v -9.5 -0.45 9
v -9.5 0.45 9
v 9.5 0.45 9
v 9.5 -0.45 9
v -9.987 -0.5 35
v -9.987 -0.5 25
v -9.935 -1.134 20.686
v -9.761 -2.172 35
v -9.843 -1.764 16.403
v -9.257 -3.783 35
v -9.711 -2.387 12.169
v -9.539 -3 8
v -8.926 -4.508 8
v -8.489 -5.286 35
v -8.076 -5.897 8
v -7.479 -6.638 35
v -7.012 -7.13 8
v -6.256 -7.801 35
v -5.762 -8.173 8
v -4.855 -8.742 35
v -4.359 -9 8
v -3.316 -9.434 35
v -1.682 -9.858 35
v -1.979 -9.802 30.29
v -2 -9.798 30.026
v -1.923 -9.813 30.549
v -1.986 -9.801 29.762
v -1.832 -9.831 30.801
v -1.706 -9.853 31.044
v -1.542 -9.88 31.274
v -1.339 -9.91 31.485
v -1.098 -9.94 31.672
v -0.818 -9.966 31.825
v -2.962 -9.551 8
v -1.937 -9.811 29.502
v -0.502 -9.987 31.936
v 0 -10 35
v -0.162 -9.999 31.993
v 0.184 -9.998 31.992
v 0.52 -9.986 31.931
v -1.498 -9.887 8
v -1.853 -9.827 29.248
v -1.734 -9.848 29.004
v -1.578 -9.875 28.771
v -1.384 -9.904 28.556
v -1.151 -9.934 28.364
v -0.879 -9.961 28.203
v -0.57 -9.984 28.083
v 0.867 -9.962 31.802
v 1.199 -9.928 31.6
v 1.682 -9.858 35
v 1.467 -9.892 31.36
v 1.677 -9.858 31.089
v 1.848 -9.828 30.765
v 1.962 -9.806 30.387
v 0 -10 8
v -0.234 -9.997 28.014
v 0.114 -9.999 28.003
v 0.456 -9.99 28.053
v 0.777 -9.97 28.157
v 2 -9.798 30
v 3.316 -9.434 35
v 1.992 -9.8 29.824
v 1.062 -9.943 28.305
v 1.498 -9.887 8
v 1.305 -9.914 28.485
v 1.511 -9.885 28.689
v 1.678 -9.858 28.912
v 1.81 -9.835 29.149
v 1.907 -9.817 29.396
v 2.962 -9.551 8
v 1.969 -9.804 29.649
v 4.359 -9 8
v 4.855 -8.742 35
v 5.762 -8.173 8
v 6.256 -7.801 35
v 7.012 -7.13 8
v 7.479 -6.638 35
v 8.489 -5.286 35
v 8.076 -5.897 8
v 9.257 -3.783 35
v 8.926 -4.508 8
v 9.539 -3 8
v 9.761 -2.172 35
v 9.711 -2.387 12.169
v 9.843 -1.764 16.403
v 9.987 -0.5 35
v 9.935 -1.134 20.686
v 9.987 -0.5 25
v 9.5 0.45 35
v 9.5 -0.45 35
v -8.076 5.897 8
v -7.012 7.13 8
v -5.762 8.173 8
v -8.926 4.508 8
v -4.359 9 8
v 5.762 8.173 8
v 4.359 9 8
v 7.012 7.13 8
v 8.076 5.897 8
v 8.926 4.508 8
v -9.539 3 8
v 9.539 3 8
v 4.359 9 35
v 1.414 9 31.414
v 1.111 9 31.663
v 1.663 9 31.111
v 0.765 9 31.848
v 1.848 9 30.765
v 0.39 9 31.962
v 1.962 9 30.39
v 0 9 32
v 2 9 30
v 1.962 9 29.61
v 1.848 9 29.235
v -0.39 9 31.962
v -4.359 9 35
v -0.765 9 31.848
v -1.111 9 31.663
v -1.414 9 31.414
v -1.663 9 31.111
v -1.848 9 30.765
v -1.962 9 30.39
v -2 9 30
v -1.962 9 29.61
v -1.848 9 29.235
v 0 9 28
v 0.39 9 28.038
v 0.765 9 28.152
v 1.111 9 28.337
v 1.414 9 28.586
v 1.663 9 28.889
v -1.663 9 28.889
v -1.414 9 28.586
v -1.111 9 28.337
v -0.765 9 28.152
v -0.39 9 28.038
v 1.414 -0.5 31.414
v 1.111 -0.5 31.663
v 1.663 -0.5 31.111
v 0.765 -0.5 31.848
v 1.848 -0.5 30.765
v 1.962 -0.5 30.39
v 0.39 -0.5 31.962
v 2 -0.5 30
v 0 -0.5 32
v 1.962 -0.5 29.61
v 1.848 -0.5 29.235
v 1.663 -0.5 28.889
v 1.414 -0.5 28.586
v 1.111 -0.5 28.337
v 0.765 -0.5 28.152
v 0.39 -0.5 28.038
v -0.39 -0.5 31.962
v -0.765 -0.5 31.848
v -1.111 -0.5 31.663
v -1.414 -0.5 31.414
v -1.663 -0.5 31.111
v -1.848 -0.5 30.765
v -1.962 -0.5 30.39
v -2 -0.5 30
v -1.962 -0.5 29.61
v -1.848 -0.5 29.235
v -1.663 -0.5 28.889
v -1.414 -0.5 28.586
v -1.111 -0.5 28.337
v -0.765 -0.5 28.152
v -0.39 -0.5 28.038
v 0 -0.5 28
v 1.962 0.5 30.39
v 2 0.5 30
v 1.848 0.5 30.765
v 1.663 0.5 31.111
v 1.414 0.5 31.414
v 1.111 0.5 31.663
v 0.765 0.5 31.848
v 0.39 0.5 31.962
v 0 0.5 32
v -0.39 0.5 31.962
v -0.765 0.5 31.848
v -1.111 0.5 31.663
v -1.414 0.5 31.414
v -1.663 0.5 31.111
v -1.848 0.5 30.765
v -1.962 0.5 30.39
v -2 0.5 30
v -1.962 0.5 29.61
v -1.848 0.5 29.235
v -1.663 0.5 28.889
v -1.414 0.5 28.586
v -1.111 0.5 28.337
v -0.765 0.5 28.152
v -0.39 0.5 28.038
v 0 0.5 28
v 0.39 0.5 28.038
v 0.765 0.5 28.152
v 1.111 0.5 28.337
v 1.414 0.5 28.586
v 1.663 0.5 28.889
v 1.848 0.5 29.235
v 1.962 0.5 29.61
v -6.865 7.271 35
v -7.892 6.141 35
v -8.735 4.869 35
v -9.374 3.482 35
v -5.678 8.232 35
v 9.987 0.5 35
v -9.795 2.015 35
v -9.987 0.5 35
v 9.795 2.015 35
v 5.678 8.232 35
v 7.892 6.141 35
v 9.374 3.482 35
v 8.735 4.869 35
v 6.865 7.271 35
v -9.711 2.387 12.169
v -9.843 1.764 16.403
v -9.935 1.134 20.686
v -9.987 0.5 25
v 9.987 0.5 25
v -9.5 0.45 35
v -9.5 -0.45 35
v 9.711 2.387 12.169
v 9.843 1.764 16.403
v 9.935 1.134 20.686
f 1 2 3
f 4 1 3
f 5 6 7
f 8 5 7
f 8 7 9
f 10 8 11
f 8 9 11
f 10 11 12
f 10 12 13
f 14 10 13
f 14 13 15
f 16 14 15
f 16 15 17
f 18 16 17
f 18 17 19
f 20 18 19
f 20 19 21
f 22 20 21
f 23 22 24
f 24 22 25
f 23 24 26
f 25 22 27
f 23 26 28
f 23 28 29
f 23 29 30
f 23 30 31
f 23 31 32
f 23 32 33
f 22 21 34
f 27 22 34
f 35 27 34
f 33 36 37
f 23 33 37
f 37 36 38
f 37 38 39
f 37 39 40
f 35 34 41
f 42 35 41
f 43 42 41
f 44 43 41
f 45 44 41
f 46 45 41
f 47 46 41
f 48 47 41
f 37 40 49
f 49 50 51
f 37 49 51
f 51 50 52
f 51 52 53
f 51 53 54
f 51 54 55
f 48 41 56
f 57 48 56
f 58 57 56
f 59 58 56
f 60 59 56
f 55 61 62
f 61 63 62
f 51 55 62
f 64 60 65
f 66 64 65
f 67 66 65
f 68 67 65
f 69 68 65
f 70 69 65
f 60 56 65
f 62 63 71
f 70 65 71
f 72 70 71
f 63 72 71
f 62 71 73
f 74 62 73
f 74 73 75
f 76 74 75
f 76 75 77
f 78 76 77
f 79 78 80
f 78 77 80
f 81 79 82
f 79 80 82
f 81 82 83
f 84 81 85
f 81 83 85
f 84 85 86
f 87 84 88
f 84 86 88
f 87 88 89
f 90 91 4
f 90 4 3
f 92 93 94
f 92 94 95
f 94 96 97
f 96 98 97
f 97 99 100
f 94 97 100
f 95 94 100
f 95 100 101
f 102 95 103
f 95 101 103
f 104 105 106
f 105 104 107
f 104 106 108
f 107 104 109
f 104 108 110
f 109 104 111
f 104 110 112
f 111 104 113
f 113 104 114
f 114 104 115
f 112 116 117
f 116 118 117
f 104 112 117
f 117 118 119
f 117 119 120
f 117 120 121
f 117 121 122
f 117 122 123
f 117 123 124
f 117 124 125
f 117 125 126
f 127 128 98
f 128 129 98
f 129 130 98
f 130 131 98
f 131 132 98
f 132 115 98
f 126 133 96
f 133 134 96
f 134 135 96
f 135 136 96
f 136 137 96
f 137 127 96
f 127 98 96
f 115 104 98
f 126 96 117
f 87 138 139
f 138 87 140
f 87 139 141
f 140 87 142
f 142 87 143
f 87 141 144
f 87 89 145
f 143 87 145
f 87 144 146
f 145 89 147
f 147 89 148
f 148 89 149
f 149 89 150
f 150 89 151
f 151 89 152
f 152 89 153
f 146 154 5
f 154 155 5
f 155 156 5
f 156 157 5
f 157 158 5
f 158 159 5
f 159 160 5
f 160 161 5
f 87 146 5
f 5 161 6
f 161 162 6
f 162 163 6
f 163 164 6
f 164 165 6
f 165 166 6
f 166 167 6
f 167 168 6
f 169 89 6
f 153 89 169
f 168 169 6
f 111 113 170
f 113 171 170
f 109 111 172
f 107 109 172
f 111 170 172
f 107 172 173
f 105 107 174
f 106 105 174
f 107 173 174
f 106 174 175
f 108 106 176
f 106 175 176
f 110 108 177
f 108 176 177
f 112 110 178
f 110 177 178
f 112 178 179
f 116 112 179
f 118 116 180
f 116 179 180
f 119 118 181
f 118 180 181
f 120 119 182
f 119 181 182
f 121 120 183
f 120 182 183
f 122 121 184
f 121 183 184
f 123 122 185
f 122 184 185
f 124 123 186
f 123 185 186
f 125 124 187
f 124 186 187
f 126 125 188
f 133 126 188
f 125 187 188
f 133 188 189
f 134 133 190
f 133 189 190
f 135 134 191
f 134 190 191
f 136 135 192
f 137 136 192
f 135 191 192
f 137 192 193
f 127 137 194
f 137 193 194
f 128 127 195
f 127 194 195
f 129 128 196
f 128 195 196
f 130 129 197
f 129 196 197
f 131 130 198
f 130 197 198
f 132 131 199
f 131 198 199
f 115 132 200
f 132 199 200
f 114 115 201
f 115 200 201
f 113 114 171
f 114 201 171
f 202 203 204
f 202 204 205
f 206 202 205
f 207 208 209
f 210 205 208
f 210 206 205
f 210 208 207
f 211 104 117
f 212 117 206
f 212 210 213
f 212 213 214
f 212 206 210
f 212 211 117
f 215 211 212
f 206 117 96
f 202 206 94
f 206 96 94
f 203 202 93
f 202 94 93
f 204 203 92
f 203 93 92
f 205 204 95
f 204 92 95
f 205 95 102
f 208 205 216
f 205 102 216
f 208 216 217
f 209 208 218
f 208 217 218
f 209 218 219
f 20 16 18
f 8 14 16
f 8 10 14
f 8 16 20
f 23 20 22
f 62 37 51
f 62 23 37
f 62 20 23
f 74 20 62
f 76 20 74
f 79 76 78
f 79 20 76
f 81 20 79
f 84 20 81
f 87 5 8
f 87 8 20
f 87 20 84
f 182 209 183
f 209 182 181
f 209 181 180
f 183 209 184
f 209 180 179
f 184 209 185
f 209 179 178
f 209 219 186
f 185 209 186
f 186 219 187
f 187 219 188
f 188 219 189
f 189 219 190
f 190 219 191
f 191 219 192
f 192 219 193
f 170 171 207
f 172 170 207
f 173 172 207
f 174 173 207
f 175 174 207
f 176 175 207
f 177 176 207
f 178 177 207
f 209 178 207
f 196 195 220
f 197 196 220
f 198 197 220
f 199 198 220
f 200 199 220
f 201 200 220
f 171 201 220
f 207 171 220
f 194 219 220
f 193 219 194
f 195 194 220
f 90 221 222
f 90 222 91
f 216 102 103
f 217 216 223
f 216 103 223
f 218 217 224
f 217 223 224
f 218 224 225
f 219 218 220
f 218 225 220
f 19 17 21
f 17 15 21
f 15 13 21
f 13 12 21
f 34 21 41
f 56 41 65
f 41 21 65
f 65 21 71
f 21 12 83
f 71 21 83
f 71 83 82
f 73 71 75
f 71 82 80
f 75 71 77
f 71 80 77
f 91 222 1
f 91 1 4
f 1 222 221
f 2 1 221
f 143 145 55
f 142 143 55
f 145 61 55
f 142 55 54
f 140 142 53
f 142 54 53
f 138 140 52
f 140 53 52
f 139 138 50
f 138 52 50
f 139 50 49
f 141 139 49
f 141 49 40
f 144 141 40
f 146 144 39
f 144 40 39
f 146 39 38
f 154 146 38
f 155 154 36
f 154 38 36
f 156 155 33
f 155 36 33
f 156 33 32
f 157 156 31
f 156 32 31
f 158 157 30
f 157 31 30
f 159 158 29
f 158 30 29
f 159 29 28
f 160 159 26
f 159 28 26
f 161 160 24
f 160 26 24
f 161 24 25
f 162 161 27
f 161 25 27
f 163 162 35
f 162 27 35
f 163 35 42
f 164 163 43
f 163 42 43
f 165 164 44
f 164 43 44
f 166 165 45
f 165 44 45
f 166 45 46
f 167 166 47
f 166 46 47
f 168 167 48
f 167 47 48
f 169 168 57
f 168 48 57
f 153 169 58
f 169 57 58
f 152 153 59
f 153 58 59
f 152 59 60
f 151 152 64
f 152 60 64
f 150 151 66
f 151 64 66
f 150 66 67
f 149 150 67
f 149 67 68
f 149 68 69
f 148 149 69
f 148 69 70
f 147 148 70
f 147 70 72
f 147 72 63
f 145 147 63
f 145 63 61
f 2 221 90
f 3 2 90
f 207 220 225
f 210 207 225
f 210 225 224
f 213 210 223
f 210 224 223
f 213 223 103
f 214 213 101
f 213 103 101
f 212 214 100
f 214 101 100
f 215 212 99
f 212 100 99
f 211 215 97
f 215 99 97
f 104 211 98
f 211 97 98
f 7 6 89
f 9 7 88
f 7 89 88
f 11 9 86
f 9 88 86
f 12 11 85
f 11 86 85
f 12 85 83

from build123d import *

# Parameters (mm, degrees)
F0_R      = 10
F1_DEPTH  = 25
F3_DEPTH  = 12.5
F4_DEPTH  = 10
F6_DEPTH  = 12.5
F7_R      = 2
F8_DEPTH  = 12.5
F9_W      = 19
F9_H      = 0.9
F10_DEPTH = 26
F11_W     = 62.5739917159
F11_H     = 29.2480699718
F12_DEPTH = 30


with BuildPart() as f1:
    # F0 (on Top) → F1 (new body)
    with BuildSketch(Plane.XY):
        Circle(F0_R)
    extrude(amount=F1_DEPTH)

    # F2 (on Right) → F3 (cut, symmetric)
    with BuildSketch(Plane.YZ):
        Polygon((-3, 8), (3, 8), (0.5, 25), (-0.5, 25), align=None)
    extrude(amount=F3_DEPTH, both=True, mode=Mode.SUBTRACT)

    # F4 (add): faces of the model
    f4_faces = [f1.faces().sort_by_distance(p)[0] for p in [
        (0, 4.5155770092, 25),
        (0, -4.5155770092, 25),
    ]]
    extrude(f4_faces, amount=F4_DEPTH)

    # F5 (on Right) → F6 (cut, symmetric)
    with BuildSketch(Plane.YZ):
        Polygon((29.1443374008, 8), (-21.5125791728, 8), (-21.9593886286, -11.827128388), (29.8704002053, -10.9335111063), align=None)
    extrude(amount=F6_DEPTH, both=True, mode=Mode.SUBTRACT)

    # F7 (on Front) → F8 (cut, symmetric)
    with BuildSketch(Plane.XZ):
        with Locations((0, 30)):
            Circle(F7_R)
    extrude(amount=F8_DEPTH, both=True, mode=Mode.SUBTRACT)

    # F11 (on face) → F12 (cut)
    with BuildSketch(Plane(origin=(0, 0, 8), x_dir=(1, 0, 0), z_dir=(0, 0, -1))):
        with Locations((3.5222135484, 0.1944573596)):
            Rectangle(F11_W, F11_H)
        with BuildLine():
            Line((19.6776342417, -9), (-17.8668759763, -9))
            Line((-17.8668759763, -9), (-17.8668759763, 9))
            Line((-17.8668759763, 9), (-4.3588989435, 9))
            ThreePointArc((-4.3588989435, 9), (0, 10), (4.3588989435, 9))
            Line((4.3588989435, 9), (19.6776342417, 9))
            Line((19.6776342417, 9), (19.6776342417, -9))
        make_face(mode=Mode.SUBTRACT)
    extrude(amount=-F12_DEPTH, mode=Mode.SUBTRACT)


with BuildPart() as f10:
    # F9 (on face) → F10 (new body)
    with BuildSketch(Plane.XY.offset(35)):
        Rectangle(F9_W, F9_H)
    extrude(amount=-F10_DEPTH)


solid = Compound([f1.part, f10.part])
